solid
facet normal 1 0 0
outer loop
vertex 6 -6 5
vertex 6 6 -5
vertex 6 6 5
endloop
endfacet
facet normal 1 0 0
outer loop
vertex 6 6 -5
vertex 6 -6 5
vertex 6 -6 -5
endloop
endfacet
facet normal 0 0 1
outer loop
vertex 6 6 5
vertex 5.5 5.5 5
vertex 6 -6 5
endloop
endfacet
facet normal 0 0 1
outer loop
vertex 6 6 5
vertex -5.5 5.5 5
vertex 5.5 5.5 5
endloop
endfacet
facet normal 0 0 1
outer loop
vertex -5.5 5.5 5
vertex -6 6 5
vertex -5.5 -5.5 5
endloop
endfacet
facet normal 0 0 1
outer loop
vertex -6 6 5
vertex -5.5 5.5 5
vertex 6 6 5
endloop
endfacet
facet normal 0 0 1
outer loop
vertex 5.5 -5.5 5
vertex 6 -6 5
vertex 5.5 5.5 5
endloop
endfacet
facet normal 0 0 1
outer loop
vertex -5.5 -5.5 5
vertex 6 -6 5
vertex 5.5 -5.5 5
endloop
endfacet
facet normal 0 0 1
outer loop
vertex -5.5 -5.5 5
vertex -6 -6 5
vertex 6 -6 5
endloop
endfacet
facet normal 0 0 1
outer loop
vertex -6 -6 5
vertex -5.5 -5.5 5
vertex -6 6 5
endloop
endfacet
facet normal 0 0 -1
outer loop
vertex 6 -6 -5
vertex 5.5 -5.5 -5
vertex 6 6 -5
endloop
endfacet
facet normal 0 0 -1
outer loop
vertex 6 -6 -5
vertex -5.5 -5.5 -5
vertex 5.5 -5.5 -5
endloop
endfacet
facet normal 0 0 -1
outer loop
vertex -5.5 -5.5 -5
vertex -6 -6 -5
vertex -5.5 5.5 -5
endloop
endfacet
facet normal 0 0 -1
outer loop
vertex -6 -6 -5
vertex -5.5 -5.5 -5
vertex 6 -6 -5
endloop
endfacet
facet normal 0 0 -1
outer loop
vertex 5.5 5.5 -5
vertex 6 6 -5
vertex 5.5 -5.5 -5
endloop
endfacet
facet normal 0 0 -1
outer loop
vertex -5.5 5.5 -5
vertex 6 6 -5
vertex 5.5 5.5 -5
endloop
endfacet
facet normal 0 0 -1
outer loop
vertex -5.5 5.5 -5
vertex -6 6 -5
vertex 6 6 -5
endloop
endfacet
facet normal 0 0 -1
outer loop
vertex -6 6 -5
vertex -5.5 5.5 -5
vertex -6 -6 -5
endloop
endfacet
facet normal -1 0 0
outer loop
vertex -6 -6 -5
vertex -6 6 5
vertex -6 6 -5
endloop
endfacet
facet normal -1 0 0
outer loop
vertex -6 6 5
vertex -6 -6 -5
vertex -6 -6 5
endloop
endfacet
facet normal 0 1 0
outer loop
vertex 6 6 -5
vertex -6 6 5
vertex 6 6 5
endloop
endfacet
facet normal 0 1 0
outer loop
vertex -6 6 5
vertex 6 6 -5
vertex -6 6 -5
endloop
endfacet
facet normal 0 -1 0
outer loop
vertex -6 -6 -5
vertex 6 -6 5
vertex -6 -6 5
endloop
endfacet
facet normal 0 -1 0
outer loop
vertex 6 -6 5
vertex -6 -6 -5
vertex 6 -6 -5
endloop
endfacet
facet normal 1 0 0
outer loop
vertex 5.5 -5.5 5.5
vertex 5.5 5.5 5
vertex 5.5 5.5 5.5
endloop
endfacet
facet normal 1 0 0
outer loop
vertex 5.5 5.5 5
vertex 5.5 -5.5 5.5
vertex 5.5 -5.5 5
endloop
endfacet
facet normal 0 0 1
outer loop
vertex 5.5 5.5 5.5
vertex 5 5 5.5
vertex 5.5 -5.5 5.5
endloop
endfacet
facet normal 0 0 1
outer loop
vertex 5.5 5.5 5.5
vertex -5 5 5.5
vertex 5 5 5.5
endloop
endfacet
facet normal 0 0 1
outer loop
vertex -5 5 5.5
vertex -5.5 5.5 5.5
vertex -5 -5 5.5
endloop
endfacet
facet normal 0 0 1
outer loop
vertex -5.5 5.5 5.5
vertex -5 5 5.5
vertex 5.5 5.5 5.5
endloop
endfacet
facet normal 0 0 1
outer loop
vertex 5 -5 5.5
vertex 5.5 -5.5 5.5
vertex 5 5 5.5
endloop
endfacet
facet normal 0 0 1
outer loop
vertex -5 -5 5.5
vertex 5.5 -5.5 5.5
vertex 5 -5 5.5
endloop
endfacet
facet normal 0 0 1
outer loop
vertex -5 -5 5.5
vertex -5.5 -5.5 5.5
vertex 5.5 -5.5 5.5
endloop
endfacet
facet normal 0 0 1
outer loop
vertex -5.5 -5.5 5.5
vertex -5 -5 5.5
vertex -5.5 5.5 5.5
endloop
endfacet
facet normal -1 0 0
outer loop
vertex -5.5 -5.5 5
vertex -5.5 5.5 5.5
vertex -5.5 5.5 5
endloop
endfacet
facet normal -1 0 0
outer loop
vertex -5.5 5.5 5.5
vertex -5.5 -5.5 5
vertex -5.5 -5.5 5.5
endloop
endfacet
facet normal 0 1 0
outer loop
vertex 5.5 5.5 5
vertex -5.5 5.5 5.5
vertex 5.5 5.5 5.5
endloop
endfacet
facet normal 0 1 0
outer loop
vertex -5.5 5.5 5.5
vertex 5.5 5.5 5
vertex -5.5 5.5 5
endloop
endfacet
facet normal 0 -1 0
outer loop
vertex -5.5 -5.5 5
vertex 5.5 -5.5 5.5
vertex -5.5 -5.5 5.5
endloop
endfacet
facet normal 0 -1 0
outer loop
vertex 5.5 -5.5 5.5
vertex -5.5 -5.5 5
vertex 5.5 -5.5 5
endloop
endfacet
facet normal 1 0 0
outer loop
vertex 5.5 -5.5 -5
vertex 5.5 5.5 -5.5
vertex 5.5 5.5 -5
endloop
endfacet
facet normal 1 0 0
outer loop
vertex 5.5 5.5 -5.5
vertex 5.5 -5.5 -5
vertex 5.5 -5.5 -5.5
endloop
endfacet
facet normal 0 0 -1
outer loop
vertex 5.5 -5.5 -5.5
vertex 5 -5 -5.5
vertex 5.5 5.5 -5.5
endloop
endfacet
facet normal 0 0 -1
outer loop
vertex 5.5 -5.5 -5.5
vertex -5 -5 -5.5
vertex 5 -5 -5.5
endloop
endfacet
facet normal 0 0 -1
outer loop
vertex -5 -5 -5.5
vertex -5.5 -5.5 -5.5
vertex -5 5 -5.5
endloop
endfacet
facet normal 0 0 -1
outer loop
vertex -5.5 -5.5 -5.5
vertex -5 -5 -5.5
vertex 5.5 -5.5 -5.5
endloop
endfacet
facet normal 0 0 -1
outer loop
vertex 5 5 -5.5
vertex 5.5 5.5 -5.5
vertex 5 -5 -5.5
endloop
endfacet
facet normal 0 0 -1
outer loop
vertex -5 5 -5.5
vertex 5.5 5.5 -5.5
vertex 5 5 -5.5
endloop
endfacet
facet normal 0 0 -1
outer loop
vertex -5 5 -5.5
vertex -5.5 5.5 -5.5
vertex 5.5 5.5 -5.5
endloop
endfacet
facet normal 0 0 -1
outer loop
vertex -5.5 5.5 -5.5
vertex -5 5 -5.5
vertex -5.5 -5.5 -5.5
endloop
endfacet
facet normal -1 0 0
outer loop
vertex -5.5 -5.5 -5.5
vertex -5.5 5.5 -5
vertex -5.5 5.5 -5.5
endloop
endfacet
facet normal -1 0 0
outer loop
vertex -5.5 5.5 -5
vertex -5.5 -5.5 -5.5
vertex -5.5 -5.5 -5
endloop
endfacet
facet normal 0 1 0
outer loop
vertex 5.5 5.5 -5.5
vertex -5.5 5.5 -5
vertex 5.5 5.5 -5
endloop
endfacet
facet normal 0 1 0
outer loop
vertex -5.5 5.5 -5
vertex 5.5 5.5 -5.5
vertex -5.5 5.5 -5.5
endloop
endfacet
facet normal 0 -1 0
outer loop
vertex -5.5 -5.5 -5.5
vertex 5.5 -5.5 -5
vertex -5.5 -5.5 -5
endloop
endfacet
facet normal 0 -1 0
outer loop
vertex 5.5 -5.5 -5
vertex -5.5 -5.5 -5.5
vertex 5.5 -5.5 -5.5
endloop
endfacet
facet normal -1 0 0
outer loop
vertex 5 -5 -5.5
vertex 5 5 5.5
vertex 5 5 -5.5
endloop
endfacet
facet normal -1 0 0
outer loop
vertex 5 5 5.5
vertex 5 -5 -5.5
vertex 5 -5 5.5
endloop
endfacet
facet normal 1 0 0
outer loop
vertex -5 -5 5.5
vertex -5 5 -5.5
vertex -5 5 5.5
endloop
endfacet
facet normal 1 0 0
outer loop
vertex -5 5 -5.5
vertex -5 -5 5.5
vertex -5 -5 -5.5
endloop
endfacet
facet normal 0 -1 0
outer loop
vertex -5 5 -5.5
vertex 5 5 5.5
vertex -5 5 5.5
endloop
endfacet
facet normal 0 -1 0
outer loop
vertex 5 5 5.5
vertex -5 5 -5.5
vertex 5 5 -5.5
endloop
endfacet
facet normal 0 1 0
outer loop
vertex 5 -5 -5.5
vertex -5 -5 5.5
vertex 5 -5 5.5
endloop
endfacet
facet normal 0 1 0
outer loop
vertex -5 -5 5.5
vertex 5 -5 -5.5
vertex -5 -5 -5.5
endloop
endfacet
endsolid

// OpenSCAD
// I think we want different wall thickness.
// I think we want an extrusion. on 2d geometry


height = 10;

difference() { 

    group() { 
        // middle section position
        cube([12,12,height], center = true);
        
        // top section positive
        translate([0,0,height / 2 ])  { 
           cube([11,11,1], center = true);
        }   
        
               
        // bottom section positive
        translate([0,0, -height / 2 ])  { 
           cube([11,11,1], center = true);
        }   
        
        
    }

   group() { 
        // hole
        color( "red") {
        cube([10,10, height * 2], center = true);
      } 
      
          
   } 
  
 
}
